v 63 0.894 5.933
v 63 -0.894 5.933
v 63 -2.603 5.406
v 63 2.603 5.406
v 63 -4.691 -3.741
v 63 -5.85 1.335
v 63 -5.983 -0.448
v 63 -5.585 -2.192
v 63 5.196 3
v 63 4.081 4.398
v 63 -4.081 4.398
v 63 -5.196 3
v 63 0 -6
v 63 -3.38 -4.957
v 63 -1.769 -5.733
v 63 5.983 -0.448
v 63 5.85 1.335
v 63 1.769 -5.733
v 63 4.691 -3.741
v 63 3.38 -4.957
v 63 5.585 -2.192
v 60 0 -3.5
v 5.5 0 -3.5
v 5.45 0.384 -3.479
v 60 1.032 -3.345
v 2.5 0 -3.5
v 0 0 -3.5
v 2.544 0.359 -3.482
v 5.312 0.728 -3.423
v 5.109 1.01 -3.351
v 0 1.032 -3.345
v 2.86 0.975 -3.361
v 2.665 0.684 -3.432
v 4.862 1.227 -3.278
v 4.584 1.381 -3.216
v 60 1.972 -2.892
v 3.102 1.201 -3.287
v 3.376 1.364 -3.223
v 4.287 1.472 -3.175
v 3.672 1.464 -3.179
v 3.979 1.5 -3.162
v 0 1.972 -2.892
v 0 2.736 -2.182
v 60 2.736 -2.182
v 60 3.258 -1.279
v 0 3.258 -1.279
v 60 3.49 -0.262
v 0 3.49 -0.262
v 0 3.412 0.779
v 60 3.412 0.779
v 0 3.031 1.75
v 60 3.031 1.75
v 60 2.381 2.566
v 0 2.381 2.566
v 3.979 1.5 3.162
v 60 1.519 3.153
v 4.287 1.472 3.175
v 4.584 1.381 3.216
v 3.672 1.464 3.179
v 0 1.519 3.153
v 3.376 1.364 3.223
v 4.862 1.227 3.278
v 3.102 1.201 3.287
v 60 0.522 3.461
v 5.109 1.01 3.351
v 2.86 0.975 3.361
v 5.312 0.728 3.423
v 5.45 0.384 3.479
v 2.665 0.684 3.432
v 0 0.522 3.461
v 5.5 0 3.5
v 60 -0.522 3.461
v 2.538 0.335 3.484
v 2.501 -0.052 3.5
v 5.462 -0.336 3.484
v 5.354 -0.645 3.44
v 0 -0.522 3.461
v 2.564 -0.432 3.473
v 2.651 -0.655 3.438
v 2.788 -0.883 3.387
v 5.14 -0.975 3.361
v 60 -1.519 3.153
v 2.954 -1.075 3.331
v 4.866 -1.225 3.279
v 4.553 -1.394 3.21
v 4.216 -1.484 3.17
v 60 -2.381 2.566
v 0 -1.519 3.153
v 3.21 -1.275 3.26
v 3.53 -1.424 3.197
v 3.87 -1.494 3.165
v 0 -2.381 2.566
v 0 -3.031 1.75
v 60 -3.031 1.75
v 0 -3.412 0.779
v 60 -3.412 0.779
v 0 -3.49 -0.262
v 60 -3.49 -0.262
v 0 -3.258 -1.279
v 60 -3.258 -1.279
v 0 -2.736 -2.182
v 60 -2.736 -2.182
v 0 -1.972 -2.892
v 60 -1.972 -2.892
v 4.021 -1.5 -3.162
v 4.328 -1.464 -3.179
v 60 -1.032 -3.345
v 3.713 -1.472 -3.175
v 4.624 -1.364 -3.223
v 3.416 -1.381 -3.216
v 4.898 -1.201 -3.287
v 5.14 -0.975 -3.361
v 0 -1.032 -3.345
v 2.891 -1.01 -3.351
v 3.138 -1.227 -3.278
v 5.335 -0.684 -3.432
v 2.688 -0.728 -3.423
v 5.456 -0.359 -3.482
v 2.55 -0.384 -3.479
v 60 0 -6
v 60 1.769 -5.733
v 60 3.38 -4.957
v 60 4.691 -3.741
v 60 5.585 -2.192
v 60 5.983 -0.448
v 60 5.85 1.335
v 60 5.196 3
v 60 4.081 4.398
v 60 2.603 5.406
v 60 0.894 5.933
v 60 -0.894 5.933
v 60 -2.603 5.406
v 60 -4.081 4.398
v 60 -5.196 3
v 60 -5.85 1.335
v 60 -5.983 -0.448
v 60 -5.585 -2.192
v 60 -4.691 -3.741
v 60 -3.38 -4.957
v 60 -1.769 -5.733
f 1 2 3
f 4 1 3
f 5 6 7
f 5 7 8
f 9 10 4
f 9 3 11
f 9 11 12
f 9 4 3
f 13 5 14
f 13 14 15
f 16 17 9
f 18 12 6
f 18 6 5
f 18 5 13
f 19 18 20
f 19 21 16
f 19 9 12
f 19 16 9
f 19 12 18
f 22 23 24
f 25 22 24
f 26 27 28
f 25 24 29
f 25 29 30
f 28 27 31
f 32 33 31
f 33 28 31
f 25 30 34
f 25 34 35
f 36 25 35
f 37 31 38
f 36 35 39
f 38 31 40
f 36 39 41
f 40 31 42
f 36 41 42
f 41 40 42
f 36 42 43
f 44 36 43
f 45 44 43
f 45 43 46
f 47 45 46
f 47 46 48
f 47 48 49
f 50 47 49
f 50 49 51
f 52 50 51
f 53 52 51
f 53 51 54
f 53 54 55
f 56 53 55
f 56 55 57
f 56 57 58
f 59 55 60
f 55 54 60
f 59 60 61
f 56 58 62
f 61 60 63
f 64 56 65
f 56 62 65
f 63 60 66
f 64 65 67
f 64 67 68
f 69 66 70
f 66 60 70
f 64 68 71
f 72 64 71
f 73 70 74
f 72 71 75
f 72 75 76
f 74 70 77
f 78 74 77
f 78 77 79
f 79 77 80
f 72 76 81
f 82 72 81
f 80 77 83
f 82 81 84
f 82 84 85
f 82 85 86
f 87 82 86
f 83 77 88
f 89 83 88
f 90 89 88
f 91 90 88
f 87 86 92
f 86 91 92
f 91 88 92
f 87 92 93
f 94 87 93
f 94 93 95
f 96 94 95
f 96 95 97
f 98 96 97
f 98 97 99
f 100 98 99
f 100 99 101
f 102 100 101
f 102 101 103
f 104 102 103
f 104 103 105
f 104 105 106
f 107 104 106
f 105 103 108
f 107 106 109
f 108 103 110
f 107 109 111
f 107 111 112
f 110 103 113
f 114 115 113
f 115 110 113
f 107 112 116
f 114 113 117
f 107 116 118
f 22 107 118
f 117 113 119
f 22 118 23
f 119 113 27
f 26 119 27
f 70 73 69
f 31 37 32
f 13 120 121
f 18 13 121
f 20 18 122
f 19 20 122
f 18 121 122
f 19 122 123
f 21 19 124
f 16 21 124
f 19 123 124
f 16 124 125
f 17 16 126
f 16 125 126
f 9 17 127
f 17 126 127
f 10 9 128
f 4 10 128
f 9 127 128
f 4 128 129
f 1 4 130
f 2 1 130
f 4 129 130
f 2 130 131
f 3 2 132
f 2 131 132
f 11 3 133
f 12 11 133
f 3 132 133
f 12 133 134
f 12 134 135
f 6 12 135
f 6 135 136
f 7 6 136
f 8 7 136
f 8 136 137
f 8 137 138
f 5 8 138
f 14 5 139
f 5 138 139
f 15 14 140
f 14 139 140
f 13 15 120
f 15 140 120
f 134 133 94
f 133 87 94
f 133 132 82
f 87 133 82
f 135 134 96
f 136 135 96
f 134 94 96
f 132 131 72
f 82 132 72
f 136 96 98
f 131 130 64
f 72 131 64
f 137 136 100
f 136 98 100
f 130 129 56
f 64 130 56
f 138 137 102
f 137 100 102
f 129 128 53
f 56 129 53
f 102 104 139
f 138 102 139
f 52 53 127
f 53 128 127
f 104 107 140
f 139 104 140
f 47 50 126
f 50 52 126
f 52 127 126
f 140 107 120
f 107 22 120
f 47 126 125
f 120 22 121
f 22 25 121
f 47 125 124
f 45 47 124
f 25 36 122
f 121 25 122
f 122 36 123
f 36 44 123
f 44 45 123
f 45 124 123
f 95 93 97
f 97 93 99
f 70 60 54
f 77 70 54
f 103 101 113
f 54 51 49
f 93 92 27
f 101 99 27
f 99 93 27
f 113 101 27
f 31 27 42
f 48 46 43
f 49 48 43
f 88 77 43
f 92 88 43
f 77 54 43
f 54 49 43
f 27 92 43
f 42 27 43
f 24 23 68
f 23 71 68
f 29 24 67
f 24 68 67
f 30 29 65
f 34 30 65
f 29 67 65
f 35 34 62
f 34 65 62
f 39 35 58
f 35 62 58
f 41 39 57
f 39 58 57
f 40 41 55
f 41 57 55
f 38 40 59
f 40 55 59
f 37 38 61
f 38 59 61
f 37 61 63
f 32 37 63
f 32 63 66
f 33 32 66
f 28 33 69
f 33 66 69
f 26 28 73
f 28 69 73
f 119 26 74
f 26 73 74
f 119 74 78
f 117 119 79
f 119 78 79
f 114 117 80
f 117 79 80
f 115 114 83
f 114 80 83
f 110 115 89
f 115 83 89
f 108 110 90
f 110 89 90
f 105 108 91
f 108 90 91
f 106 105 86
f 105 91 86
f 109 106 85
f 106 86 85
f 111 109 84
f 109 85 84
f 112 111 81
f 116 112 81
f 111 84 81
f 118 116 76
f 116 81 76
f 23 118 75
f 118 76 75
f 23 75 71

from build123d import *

# Parameters (mm, degrees)
SKETCH1_R               = 3.5
BOSS_EXTRUDE1_DEPTH     = 60
SKETCH2_R               = 6
BOSS_EXTRUDE2_DEPTH     = 3
SKETCH3_R               = 1.5
CUT_EXTRUDE1_DEPTH      = 7
CUT_EXTRUDE1_DEPTH_BACK = 7


with BuildPart() as part:
    # Sketch1 → Boss-Extrude1 (new body)
    with BuildSketch(Plane(origin=(0, 0, 0), x_dir=(0, 0, -1), z_dir=(1, 0, 0))):
        Circle(SKETCH1_R)
    extrude(amount=BOSS_EXTRUDE1_DEPTH)

    # Sketch2 → Boss-Extrude2 (add)
    with BuildSketch(Plane(origin=(60, 0, 0), x_dir=(0, 0, -1), z_dir=(1, 0, 0))):
        Circle(SKETCH2_R)
    extrude(amount=BOSS_EXTRUDE2_DEPTH)

    # Sketch3 → Cut-Extrude1 (cut, two sides)
    with BuildSketch(Plane.XY) as cut_extrude1_sk:
        with Locations((4, 0)):
            Circle(SKETCH3_R)
    extrude(amount=CUT_EXTRUDE1_DEPTH, mode=Mode.SUBTRACT)
    extrude(cut_extrude1_sk.sketch, amount=-CUT_EXTRUDE1_DEPTH_BACK, mode=Mode.SUBTRACT)


solid = part.part
